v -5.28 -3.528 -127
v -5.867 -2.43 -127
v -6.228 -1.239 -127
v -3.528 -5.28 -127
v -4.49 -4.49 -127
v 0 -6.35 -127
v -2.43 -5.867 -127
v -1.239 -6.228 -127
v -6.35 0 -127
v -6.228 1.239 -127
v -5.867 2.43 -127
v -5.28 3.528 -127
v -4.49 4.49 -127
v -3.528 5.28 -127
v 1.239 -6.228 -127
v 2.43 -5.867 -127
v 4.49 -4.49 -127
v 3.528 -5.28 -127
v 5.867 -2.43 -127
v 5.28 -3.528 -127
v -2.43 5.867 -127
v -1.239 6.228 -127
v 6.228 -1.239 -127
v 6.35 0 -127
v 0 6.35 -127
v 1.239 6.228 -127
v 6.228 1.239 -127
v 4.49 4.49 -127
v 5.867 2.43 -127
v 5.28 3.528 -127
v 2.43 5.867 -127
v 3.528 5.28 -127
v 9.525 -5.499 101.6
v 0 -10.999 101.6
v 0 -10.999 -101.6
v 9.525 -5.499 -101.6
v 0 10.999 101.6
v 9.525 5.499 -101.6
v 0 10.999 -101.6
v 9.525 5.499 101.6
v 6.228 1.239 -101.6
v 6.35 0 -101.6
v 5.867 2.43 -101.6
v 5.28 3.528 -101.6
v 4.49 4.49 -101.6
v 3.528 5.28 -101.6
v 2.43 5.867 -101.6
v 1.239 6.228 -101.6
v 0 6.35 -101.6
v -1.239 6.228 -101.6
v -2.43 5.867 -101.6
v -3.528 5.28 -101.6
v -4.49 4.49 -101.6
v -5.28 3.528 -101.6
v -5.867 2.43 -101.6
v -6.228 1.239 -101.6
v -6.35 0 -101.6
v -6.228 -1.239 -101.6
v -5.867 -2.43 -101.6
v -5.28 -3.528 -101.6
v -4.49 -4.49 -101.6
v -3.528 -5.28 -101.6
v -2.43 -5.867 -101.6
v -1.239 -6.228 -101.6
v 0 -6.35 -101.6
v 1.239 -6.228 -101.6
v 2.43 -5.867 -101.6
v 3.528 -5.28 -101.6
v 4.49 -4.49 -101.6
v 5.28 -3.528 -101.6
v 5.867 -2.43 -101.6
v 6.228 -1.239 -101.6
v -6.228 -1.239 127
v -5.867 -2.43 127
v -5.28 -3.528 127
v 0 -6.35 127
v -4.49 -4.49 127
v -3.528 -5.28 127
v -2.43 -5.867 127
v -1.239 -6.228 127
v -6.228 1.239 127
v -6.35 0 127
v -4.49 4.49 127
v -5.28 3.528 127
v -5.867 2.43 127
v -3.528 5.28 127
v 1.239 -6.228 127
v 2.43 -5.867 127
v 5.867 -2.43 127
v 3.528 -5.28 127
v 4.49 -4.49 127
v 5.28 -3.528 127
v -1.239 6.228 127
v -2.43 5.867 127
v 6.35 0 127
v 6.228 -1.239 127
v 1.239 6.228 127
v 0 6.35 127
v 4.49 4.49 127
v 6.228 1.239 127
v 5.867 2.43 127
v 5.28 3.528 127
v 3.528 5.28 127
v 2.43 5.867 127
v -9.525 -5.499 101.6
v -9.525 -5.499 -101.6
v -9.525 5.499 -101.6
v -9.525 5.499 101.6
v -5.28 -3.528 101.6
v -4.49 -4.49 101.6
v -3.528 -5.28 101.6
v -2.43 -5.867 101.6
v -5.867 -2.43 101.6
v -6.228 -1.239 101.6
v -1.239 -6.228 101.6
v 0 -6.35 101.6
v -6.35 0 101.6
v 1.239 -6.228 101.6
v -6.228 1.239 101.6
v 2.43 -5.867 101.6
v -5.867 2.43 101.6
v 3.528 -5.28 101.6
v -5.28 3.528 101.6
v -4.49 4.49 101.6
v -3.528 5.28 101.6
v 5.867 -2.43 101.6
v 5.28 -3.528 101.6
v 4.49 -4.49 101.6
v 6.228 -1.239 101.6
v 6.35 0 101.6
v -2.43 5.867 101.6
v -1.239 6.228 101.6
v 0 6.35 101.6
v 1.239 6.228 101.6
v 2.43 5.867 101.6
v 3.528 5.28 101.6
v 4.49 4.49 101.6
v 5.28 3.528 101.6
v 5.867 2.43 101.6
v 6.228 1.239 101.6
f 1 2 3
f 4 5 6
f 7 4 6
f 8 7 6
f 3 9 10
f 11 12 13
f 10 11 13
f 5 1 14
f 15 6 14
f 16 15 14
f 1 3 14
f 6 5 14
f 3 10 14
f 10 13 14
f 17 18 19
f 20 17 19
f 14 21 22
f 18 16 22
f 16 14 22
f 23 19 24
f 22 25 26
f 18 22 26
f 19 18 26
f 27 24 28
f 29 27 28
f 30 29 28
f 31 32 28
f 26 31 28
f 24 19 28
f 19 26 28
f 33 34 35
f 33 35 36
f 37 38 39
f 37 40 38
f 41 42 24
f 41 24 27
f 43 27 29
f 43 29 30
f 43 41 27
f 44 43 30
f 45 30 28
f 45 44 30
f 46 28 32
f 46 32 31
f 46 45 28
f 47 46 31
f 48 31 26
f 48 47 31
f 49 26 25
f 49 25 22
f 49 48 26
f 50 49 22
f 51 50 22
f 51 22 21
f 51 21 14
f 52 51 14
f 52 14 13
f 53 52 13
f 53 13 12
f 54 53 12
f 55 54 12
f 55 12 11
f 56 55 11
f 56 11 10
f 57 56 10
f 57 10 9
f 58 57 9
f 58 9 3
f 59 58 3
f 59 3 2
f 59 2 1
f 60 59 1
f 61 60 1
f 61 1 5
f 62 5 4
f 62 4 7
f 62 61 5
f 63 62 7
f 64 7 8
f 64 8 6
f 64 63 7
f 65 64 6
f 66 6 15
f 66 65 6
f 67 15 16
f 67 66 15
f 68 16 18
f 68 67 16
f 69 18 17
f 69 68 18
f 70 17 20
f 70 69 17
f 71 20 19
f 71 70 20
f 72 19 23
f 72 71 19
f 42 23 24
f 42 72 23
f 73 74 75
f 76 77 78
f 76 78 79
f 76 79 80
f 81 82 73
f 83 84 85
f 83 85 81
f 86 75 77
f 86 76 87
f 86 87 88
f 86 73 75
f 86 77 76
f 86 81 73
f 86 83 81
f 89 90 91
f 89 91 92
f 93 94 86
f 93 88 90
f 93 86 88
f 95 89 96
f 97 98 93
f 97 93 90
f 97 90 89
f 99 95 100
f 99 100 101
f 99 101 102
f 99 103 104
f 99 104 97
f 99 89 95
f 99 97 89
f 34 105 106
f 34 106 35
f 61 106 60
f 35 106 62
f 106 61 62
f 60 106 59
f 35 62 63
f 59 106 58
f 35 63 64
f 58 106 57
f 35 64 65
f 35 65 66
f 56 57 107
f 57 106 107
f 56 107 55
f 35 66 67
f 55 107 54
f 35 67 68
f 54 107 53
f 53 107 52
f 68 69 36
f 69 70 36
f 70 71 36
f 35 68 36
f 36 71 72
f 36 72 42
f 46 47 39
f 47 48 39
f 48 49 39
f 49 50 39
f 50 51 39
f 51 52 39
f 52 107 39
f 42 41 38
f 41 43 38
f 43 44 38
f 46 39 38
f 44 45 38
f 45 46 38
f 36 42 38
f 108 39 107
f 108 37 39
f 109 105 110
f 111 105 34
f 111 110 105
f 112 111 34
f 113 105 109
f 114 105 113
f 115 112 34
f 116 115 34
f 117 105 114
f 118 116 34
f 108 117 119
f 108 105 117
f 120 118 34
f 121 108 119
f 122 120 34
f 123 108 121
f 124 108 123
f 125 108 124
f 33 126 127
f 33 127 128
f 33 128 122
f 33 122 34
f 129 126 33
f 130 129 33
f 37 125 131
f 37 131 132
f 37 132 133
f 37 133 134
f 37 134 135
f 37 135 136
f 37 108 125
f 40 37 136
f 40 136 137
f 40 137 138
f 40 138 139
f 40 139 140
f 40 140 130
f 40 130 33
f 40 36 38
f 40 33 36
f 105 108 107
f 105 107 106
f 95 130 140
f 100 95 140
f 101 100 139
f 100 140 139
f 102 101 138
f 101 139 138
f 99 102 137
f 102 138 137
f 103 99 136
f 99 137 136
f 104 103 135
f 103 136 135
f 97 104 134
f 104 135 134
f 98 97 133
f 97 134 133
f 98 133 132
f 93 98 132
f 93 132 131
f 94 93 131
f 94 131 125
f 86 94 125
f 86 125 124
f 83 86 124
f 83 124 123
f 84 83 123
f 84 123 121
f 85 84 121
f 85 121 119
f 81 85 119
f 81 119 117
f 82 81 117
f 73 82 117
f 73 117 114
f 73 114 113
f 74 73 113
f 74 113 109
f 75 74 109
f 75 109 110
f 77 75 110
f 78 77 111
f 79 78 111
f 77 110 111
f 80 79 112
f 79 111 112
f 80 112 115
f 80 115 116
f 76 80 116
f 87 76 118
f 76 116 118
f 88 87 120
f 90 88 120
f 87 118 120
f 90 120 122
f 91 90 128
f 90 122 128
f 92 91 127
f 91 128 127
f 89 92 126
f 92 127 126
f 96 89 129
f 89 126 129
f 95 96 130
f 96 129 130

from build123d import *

# Parameters (mm, degrees)
BOSS_EXTRUDE1_DEPTH      = 101.6
SKETCH2_R                = 6.35
BOSS_EXTRUDE2_DEPTH      = 127
BOSS_EXTRUDE2_DEPTH_BACK = 127


with BuildPart() as part:
    # Sketch1 → Boss-Extrude1 (new body, symmetric)
    with BuildSketch(Plane.XY):
        Polygon((0, 10.998522628), (-9.525, 5.499261314), (-9.525, -5.499261314), (0, -10.998522628), (9.525, -5.499261314), (9.525, 5.499261314), align=None)
    extrude(amount=BOSS_EXTRUDE1_DEPTH, both=True)

    # Sketch2 → Boss-Extrude2 (add, two sides)
    with BuildSketch(Plane.XY) as boss_extrude2_sk:
        Circle(SKETCH2_R)
    extrude(amount=BOSS_EXTRUDE2_DEPTH)
    extrude(boss_extrude2_sk.sketch, amount=-BOSS_EXTRUDE2_DEPTH_BACK)


solid = part.part
